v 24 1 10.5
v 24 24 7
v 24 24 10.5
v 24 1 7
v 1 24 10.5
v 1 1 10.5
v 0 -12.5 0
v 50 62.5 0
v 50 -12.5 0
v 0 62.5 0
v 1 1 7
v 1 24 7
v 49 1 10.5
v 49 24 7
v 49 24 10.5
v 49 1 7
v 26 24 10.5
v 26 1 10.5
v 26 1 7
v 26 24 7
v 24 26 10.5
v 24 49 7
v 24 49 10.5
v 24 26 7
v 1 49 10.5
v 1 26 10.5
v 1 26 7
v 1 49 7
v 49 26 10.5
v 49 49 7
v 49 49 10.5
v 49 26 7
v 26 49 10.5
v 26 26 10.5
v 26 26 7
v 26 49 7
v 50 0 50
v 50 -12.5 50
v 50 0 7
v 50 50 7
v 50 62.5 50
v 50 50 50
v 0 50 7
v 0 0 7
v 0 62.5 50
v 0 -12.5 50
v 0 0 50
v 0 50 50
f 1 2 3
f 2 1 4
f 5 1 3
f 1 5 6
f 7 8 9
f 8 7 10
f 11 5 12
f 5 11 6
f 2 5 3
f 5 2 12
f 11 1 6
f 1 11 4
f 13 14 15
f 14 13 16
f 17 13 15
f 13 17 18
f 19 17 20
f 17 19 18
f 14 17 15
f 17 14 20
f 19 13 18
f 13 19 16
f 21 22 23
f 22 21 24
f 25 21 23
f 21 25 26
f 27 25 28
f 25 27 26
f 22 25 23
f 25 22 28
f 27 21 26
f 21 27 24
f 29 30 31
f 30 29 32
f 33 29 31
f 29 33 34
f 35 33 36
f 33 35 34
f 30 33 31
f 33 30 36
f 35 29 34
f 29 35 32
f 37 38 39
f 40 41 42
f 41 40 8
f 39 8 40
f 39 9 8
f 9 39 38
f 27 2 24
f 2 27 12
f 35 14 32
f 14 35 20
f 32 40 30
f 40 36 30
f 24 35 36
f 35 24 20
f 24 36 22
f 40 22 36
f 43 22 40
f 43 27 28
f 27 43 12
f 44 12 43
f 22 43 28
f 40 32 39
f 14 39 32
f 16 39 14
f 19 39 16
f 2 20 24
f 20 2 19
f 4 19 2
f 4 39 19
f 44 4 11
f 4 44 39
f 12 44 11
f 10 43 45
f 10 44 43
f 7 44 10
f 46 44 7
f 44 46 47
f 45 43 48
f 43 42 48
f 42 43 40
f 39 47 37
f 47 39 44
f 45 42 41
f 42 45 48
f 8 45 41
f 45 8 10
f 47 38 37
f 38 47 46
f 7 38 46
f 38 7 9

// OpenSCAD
color("LightGray") {
    translate([1,1,0]) cube([23,23,6+4.5]);
    translate([25+1,1,0]) cube([23,23,6+4.5]);
    translate([1,25+1,0]) cube([23,23,6+4.5]);
    translate([25+1,25+1,0]) cube([23,23,6+4.5]);
}
color("Grey") {
    cube([50,50,7]);
    translate([0,50,0]) cube([50,12.5,50]);
    translate([0,-12.5,0]) cube([50,12.5,50]);
}
